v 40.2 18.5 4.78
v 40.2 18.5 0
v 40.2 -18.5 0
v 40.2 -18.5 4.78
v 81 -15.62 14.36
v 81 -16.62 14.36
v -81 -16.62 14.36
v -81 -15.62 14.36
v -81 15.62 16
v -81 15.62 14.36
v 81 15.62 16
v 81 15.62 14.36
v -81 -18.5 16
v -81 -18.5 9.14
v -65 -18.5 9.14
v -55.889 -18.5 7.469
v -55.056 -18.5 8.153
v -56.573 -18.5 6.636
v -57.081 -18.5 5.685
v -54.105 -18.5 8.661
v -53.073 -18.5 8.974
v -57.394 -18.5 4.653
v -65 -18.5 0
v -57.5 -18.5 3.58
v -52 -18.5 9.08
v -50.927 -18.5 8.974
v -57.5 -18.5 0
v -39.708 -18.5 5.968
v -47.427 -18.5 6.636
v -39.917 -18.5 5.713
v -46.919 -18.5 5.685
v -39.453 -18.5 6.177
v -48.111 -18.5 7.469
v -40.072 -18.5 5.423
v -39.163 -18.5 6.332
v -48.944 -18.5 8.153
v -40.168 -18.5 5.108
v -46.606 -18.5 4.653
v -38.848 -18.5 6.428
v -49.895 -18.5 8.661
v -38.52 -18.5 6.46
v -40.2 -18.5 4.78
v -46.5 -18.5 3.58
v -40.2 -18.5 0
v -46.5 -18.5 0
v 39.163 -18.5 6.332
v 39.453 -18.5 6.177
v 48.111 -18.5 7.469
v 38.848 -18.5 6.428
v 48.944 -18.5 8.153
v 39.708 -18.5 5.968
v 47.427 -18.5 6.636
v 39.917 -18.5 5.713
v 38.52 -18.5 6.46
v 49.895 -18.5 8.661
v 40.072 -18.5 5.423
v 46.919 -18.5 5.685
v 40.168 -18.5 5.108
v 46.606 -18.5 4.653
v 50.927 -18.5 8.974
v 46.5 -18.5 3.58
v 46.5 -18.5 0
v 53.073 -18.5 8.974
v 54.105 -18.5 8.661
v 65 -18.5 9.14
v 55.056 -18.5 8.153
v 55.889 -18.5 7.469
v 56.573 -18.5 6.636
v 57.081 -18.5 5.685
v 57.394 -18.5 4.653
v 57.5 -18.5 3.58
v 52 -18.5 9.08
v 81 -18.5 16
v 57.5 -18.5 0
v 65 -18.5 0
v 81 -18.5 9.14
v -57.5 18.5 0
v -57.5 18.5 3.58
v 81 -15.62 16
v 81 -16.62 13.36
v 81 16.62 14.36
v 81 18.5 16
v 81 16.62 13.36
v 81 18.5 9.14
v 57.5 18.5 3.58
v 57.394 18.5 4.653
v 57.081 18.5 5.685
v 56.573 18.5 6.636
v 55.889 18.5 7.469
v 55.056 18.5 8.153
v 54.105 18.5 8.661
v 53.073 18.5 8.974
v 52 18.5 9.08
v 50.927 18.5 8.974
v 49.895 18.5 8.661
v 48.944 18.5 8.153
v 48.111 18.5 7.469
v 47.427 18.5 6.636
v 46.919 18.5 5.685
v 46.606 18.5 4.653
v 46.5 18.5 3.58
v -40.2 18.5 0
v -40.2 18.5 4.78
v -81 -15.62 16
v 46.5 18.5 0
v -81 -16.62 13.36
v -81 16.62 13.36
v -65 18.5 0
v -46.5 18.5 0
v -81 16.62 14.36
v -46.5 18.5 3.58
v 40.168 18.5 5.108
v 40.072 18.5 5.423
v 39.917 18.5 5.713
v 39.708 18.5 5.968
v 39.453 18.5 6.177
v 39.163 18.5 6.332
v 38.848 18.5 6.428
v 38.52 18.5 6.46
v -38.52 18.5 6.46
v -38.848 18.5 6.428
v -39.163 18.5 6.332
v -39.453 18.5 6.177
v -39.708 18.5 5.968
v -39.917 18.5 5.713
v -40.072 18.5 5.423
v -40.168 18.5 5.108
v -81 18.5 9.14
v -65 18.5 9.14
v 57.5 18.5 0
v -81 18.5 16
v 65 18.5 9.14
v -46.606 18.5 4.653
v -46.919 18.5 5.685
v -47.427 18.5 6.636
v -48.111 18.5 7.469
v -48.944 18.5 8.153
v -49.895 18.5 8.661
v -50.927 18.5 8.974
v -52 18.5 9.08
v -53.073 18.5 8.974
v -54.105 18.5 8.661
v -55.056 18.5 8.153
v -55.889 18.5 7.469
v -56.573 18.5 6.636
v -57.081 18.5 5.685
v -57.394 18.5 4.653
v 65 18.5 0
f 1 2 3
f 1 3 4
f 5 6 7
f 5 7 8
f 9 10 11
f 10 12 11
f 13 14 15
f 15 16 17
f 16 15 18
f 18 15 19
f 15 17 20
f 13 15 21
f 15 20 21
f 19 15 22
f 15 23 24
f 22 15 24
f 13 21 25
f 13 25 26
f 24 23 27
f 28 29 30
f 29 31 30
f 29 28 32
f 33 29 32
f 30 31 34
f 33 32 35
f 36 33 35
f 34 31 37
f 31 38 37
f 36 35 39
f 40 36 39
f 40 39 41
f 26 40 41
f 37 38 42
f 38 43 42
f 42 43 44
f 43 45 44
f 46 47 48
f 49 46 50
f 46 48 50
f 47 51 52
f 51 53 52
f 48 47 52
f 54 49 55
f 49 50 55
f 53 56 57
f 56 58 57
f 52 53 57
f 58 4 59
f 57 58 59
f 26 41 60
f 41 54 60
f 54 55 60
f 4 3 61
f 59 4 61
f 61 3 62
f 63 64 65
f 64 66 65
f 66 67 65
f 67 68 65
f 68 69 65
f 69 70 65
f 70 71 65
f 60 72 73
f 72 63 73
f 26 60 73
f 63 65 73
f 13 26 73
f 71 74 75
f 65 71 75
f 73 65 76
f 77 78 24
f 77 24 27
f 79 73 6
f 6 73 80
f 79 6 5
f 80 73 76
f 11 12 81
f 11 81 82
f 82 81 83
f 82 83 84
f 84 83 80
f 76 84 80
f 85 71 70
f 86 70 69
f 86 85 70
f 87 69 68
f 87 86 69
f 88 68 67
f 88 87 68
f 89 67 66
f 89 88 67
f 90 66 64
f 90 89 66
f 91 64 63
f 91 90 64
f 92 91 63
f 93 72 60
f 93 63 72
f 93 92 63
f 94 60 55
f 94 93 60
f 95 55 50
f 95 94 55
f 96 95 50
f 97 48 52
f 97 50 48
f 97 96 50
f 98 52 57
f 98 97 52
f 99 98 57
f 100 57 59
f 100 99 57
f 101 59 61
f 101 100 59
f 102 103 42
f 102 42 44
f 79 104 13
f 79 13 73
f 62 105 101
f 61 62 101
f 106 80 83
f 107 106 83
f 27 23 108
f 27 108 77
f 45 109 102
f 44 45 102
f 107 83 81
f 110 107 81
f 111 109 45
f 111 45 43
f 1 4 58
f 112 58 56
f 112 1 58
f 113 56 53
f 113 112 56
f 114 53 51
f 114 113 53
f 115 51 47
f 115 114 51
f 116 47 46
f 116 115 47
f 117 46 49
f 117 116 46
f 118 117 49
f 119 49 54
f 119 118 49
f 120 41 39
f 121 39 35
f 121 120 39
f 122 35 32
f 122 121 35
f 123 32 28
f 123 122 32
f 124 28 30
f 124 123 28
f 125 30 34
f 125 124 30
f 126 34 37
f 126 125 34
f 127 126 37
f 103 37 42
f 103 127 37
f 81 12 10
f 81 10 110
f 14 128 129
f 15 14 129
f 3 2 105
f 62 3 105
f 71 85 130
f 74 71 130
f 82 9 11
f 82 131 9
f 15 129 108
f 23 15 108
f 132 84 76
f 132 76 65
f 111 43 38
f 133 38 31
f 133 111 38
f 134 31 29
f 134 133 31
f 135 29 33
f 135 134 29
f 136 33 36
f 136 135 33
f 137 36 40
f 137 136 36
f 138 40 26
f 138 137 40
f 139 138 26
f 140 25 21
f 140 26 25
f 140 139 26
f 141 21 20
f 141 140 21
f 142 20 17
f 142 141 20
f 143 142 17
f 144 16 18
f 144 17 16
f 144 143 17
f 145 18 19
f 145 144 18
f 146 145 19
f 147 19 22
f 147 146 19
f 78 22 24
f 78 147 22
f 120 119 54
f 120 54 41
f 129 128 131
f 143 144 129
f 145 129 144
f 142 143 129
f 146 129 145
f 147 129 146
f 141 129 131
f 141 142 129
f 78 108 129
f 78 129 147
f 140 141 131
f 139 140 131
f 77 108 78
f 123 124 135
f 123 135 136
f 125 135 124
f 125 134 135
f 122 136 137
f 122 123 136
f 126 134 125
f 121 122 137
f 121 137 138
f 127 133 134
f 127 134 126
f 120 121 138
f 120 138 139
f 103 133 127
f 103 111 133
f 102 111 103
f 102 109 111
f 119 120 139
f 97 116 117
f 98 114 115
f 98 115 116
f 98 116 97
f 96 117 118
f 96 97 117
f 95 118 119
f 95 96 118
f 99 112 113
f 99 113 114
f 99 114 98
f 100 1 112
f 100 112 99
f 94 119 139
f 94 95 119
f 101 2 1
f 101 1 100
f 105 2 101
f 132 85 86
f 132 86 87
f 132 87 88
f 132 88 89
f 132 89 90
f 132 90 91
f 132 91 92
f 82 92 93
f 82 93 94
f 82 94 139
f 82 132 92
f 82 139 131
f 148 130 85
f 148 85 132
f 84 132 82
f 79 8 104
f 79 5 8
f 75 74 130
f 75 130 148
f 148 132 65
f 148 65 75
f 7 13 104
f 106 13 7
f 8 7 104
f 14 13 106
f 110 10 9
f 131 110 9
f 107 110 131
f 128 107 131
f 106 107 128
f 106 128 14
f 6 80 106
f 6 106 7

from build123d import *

# Parameters (mm, degrees)
SKETCH_W             = 162
SKETCH_H             = 37
PAD_DEPTH            = 16
POCKET_DEPTH         = 18.501
POCKET_DEPTH_BACK    = -18.501
POCKET001_DEPTH      = 18.501
POCKET001_DEPTH_BACK = -18.501
POCKET002_DEPTH      = 18.501
POCKET002_DEPTH_BACK = -18.501
POCKET003_DEPTH      = 18.501
POCKET003_DEPTH_BACK = -18.501
POCKET004_DEPTH      = 18.501
POCKET004_DEPTH_BACK = -18.501
SKETCH004_W          = 31.24
SKETCH004_H          = 3.92
POCKET005_DEPTH      = 81.001
POCKET005_DEPTH_BACK = -81.001
SKETCH005_W          = 33.24
SKETCH005_H          = 1
POCKET006_DEPTH      = 81.001
POCKET006_DEPTH_BACK = -81.001


with BuildPart() as part:
    # Sketch → Pad (new body)
    with BuildSketch(Plane.XY):
        Rectangle(SKETCH_W, SKETCH_H)
    extrude(amount=PAD_DEPTH)

    # Sketch001 → Pocket (cut, two sides)
    with BuildSketch(Plane.XZ) as pocket_sk:
        Polygon((81, 16), (81, 9.14), (65, 9.14), (65, -1.45), (83.75, -1.45), (83.75, 16), align=None)
    extrude(amount=-POCKET_DEPTH, mode=Mode.SUBTRACT)
    extrude(pocket_sk.sketch, amount=-POCKET_DEPTH_BACK, mode=Mode.SUBTRACT)

    # MirroredSketch → Pocket001 (cut, two sides)
    with BuildSketch(Plane.XZ) as pocket001_sk:
        Polygon((-81, 16), (-81, 9.14), (-65, 9.14), (-65, -1.45), (-83.75, -1.45), (-83.75, 16), align=None)
    extrude(amount=-POCKET001_DEPTH, mode=Mode.SUBTRACT)
    extrude(pocket001_sk.sketch, amount=-POCKET001_DEPTH_BACK, mode=Mode.SUBTRACT)

    # Sketch002 → Pocket002 (cut, two sides)
    with BuildSketch(Plane.XZ) as pocket002_sk:
        with BuildLine():
            Line((57.5, 3.58), (57.5, -2.6))
            Line((57.5, -2.6), (46.5, -2.6))
            Line((46.5, -2.6), (46.5, 3.58))
            ThreePointArc((57.5, 3.58), (52, 9.08), (46.5, 3.58))
        make_face()
    extrude(amount=-POCKET002_DEPTH, mode=Mode.SUBTRACT)
    extrude(pocket002_sk.sketch, amount=-POCKET002_DEPTH_BACK, mode=Mode.SUBTRACT)

    # MirroredSketch001 → Pocket003 (cut, two sides)
    with BuildSketch(Plane.XZ) as pocket003_sk:
        with BuildLine():
            Line((-57.5, 3.58), (-57.5, -2.6))
            Line((-57.5, -2.6), (-46.5, -2.6))
            Line((-46.5, -2.6), (-46.5, 3.58))
            ThreePointArc((-46.5, 3.58), (-52, 9.08), (-57.5, 3.58))
        make_face()
    extrude(amount=-POCKET003_DEPTH, mode=Mode.SUBTRACT)
    extrude(pocket003_sk.sketch, amount=-POCKET003_DEPTH_BACK, mode=Mode.SUBTRACT)

    # Sketch003 → Pocket004 (cut, two sides)
    with BuildSketch(Plane.XZ) as pocket004_sk:
        with BuildLine():
            Line((-40.2, 4.78), (-40.2, -1.94))
            Line((-40.2, -1.94), (40.2, -1.94))
            Line((40.2, -1.94), (40.2, 4.78))
            ThreePointArc((40.2, 4.78), (39.707939, 5.967939), (38.52, 6.46))
            Line((38.52, 6.46), (-38.52, 6.46))
            ThreePointArc((-38.52, 6.46), (-39.707939, 5.967939), (-40.2, 4.78))
        make_face()
    extrude(amount=-POCKET004_DEPTH, mode=Mode.SUBTRACT)
    extrude(pocket004_sk.sketch, amount=-POCKET004_DEPTH_BACK, mode=Mode.SUBTRACT)

    # Sketch004 → Pocket005 (cut, two sides)
    with BuildSketch(Plane.YZ) as pocket005_sk:
        with Locations((0, 15.32)):
            Rectangle(SKETCH004_W, SKETCH004_H)
    extrude(amount=-POCKET005_DEPTH, mode=Mode.SUBTRACT)
    extrude(pocket005_sk.sketch, amount=-POCKET005_DEPTH_BACK, mode=Mode.SUBTRACT)

    # Sketch005 → Pocket006 (cut, two sides)
    with BuildSketch(Plane.YZ) as pocket006_sk:
        with Locations((0, 13.86)):
            Rectangle(SKETCH005_W, SKETCH005_H)
    extrude(amount=-POCKET006_DEPTH, mode=Mode.SUBTRACT)
    extrude(pocket006_sk.sketch, amount=-POCKET006_DEPTH_BACK, mode=Mode.SUBTRACT)


solid = part.part
